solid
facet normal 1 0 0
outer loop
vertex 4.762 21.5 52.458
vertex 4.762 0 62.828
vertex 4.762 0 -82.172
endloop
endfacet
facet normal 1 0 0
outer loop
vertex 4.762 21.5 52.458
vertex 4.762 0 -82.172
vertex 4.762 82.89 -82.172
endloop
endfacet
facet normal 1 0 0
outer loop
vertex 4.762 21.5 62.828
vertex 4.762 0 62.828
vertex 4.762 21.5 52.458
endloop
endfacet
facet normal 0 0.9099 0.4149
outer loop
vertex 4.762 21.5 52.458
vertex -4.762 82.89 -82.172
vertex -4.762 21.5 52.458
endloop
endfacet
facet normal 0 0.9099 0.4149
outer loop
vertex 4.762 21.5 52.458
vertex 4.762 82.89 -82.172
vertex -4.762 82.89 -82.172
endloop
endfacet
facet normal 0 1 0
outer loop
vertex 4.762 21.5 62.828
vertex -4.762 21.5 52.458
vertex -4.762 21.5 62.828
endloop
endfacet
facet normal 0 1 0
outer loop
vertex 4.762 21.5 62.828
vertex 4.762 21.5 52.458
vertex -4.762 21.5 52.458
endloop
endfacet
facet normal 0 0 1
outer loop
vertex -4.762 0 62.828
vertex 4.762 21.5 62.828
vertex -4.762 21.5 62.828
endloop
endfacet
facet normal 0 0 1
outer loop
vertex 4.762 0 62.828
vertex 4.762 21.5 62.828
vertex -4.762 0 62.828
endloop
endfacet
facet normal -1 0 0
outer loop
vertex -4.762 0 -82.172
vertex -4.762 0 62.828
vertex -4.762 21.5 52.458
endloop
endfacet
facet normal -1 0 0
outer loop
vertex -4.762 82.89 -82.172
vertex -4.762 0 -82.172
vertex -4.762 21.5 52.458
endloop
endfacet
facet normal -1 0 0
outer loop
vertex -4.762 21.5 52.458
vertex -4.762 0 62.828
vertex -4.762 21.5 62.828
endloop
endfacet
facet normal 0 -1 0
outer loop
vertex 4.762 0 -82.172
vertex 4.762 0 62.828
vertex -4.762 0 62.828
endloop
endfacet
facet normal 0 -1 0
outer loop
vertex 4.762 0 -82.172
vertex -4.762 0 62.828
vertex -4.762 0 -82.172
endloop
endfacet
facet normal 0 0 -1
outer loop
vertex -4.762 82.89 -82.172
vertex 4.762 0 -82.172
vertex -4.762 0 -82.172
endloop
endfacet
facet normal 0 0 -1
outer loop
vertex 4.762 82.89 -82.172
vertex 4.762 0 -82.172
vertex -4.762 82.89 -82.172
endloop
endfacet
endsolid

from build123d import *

# Parameters (mm, degrees)
F1_DEPTH = 4.7625


# Not quite as in the source:
# - a length typed as a fraction of an inch, garbled in the dataset ("3 / 203.2 mm" for 3/8 in), is restored


with BuildPart() as f1:
    # F0 (on Right) → F1 (new body, symmetric)
    with BuildSketch(Plane.YZ):
        Polygon((21.5, 62.8277051401), (0, 62.8277051401), (0, -82.1722948599), (82.89, -82.1722948599), (21.5, 52.4577051401), align=None)
    extrude(amount=F1_DEPTH, both=True)


solid = f1.part
